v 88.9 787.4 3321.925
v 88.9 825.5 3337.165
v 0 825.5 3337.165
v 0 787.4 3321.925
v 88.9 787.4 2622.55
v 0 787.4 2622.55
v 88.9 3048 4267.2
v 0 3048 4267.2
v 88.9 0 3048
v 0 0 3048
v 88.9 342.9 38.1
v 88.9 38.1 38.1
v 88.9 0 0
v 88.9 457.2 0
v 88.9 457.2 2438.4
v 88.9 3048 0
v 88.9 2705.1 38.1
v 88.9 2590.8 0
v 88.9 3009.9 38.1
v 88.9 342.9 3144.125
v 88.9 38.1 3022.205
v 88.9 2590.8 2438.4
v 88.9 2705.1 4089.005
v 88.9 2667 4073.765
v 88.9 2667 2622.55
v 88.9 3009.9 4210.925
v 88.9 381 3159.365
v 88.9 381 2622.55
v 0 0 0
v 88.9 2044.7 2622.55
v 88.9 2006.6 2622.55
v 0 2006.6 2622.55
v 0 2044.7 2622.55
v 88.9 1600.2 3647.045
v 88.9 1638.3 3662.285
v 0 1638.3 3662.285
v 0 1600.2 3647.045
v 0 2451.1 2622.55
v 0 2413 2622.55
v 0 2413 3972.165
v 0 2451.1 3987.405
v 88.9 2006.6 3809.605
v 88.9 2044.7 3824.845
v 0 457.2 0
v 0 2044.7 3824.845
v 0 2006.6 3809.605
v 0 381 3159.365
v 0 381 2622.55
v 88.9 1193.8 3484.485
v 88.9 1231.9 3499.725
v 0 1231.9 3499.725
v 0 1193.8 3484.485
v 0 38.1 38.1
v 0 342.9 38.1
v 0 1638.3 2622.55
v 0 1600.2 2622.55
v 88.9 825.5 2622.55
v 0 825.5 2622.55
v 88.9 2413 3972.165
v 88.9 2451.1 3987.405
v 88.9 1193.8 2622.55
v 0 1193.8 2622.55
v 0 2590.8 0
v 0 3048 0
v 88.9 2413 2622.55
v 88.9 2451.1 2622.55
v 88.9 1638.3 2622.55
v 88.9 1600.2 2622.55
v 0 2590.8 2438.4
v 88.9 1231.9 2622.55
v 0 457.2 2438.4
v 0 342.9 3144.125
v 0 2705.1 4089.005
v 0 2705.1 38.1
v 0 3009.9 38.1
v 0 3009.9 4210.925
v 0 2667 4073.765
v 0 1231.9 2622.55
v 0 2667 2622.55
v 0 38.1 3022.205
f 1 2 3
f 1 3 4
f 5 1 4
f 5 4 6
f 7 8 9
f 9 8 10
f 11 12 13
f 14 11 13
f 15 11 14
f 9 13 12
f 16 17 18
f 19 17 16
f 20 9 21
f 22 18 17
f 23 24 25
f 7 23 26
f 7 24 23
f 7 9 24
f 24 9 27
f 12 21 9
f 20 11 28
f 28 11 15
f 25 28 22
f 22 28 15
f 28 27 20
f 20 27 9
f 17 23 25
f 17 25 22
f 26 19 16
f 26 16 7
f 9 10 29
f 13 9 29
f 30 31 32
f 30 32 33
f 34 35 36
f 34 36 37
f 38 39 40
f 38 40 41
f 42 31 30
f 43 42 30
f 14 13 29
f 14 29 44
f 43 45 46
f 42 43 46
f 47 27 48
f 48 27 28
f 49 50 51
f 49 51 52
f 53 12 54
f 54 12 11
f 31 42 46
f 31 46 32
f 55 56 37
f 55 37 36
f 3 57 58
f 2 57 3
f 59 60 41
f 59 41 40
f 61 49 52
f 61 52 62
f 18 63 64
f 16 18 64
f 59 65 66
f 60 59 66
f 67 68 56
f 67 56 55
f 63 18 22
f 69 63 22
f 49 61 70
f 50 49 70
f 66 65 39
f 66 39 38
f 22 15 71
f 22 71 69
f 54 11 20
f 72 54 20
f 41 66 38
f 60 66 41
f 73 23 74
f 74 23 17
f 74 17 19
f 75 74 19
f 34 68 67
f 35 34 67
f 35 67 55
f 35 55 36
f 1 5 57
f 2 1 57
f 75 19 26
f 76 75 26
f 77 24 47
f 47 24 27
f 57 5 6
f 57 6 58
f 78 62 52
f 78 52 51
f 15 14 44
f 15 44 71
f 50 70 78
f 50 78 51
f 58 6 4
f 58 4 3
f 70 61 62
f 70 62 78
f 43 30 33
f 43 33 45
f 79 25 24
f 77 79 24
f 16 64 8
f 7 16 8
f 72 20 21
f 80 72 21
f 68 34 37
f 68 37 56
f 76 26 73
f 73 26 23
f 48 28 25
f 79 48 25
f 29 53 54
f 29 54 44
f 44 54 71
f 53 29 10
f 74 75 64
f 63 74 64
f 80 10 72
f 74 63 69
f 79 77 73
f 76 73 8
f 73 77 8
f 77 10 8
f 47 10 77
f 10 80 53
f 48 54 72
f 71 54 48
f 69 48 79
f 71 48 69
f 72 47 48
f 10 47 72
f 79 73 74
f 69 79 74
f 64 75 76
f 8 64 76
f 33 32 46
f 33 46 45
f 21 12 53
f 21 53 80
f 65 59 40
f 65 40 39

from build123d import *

# Parameters (mm, degrees)
F1_DEPTH  = 88.9
F2_W      = 2133.6
F2_H      = 2438.4
F3_DEPTH  = 88.901
F4_W      = 304.8
F4_H      = 2438.4
F5_DEPTH  = 88.901
F7_DEPTH  = 88.901
F9_DEPTH  = 88.901
F11_DEPTH = 88.9
F12_W     = 304.8
F12_H     = 38.1
F13_DEPTH = 88.9


with BuildPart() as f1:
    # F0 (on Right) → F1 (new body)
    with BuildSketch(Plane.YZ):
        Polygon((0, 3048), (0, 0), (3048, 0), (3048, 4267.2), align=None)
    extrude(amount=F1_DEPTH)

    # F2 (on face) → F3 (cut, through all)
    with BuildSketch(Plane.YZ.offset(88.9)):
        with Locations((1524, 1219.2)):
            Rectangle(F2_W, F2_H)
    extrude(amount=-F3_DEPTH, mode=Mode.SUBTRACT)

    # F4 (on face) → F5 (cut, through all)
    with BuildSketch(Plane.YZ.offset(88.9)):
        with Locations((190.5, 1219.2)):
            Rectangle(F4_W, F4_H)
        with Locations((2857.5, 1219.2)):
            Rectangle(F4_W, F4_H)
    extrude(amount=-F5_DEPTH, mode=Mode.SUBTRACT)

    # F6 (on face) → F7 (cut, through all)
    with BuildSketch(Plane.YZ.offset(88.9)):
        Polygon((381, 3159.365044), (381, 2622.55), (2667, 2622.55), (2667, 4073.765044), align=None)
    extrude(amount=-F7_DEPTH, mode=Mode.SUBTRACT)

    # F8 (on face) → F9 (cut, through all)
    with BuildSketch(Plane.YZ.offset(88.9)):
        Polygon((38.1, 3022.205044), (38.1, 2438.4), (342.9, 2438.4), (342.9, 3144.125044), align=None)
        Polygon((2705.1, 4089.005044), (2705.1, 2438.4), (3009.9, 2438.4), (3009.9, 4210.925044), align=None)
    extrude(amount=-F9_DEPTH, mode=Mode.SUBTRACT)

    # F12 (on face) → F13 (join)
    with BuildSketch(Plane.YZ.offset(88.9)):
        with Locations((190.5, 19.05)):
            Rectangle(F12_W, F12_H)
        with Locations((2857.5, 19.05)):
            Rectangle(F12_W, F12_H)
    extrude(amount=-F13_DEPTH)


with BuildPart() as f11:
    # F10 (on face) → F11 (new body)
    with BuildSketch(Plane.YZ.offset(88.9)):
        Polygon((825.5, 3337.165044), (787.4, 3321.925044), (787.4, 2622.55), (825.5, 2622.55), align=None)
        Polygon((1231.9, 3499.725044), (1193.8, 3484.485044), (1193.8, 2622.55), (1231.9, 2622.55), align=None)
        Polygon((1638.3, 3662.285044), (1600.2, 3647.045044), (1600.2, 2622.55), (1638.3, 2622.55), align=None)
        Polygon((2044.7, 3824.845044), (2006.6, 3809.605044), (2006.6, 2622.55), (2044.7, 2622.55), align=None)
        Polygon((2451.1, 3987.405044), (2413, 3972.165044), (2413, 2622.55), (2451.1, 2622.55), align=None)
    extrude(amount=-F11_DEPTH)


solid = Compound([f1.part, f11.part])
